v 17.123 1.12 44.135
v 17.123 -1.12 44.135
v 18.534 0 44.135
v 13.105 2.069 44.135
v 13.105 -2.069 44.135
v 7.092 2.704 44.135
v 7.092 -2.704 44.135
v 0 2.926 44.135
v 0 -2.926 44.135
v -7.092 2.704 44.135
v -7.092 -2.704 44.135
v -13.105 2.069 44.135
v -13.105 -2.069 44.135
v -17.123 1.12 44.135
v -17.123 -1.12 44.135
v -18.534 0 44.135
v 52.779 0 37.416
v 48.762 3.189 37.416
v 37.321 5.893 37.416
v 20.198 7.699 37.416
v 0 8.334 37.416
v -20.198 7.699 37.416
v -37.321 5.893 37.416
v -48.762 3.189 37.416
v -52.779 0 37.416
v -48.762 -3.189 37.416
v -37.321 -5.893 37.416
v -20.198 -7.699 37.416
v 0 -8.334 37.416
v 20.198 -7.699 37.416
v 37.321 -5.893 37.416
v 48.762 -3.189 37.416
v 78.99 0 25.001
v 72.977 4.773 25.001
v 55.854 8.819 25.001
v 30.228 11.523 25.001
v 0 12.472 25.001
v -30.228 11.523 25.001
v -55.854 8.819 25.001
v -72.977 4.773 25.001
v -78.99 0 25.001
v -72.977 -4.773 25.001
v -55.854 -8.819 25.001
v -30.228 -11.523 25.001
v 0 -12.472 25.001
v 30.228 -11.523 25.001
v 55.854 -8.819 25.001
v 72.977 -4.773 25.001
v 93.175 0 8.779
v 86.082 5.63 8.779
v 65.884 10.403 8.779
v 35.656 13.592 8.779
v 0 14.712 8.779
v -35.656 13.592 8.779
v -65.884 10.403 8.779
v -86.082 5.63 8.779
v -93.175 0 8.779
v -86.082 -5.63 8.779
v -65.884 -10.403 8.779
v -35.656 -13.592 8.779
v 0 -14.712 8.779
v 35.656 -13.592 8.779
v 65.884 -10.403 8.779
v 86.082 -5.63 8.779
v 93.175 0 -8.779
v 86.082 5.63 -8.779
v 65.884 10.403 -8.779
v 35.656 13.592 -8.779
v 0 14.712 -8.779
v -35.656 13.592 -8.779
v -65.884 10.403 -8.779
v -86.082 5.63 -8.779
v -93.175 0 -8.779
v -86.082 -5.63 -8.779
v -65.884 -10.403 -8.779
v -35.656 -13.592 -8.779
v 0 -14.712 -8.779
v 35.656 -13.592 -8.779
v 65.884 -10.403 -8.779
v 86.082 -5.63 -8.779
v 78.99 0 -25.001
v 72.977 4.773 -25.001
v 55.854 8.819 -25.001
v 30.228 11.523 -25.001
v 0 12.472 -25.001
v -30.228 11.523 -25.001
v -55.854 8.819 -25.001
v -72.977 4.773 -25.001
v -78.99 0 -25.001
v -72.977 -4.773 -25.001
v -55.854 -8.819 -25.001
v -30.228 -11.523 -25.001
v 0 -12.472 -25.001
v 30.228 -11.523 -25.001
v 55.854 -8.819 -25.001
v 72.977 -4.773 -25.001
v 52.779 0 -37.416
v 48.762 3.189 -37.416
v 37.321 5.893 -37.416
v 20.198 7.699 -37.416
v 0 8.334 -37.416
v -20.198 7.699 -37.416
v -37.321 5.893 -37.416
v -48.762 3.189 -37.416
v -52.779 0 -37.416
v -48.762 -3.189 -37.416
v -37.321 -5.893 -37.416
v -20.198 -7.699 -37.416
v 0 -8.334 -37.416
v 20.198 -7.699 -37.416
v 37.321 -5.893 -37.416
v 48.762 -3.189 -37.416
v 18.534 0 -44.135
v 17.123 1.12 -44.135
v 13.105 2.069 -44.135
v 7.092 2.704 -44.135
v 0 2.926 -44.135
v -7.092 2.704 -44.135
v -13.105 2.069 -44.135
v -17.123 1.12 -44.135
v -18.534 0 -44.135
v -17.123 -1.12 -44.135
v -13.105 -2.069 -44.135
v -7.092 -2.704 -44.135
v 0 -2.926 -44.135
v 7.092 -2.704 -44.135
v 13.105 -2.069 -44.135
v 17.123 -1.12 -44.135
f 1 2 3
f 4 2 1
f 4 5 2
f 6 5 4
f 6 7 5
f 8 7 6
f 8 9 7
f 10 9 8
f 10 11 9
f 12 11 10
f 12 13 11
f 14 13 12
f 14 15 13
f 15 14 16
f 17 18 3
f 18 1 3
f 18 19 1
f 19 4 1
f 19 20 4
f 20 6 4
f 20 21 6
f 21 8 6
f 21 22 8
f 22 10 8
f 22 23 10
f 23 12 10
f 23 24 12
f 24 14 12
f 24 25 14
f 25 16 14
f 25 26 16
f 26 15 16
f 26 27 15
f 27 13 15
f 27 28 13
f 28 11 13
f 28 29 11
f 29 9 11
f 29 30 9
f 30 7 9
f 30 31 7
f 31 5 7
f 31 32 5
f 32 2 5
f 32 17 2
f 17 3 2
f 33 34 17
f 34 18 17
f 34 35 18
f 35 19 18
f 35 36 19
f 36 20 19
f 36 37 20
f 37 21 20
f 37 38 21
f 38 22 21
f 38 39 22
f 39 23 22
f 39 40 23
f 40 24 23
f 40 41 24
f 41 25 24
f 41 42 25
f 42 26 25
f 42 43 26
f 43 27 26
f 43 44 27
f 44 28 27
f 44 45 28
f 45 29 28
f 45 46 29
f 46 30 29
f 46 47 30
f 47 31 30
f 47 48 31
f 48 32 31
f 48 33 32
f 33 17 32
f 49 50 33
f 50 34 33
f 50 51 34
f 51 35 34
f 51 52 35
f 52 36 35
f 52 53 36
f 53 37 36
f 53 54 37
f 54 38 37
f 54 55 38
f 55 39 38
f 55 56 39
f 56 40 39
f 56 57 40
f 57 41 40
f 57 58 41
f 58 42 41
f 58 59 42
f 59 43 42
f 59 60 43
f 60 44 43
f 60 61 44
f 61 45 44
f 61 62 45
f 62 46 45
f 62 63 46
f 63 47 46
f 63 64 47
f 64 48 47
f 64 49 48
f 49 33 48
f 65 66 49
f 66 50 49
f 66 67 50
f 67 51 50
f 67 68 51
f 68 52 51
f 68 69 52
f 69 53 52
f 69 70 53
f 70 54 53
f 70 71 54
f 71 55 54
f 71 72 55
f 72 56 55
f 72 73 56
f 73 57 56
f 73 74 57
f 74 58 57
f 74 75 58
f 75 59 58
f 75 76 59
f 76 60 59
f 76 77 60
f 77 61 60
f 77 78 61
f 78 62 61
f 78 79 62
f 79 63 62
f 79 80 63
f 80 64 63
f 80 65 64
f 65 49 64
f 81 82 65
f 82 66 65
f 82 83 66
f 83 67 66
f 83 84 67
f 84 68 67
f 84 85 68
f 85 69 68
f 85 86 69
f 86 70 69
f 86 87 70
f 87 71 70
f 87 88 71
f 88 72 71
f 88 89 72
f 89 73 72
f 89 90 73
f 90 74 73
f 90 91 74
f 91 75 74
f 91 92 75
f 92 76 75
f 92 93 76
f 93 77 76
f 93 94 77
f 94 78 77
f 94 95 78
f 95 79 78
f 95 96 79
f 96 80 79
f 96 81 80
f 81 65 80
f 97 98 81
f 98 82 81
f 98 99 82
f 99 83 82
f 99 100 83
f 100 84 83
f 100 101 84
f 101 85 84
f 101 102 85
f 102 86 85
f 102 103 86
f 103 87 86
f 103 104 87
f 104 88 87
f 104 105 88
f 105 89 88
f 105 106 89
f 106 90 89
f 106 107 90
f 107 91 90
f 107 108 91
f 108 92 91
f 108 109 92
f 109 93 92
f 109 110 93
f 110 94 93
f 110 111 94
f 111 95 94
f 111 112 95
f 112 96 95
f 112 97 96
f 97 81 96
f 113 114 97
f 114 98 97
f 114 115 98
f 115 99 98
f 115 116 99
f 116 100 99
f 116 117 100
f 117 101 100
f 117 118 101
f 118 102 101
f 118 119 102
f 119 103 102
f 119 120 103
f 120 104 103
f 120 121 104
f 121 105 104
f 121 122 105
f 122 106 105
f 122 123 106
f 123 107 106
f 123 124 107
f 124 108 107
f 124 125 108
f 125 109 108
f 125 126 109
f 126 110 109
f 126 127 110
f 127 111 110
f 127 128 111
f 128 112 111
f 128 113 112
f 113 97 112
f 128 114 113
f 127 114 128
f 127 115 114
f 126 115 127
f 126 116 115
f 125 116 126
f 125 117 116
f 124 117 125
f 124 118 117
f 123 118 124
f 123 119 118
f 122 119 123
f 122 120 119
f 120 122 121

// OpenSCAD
// Generated by SolidPython 1.0.1 on 2020-07-29 00:46:53


scale(v = [19, 3, 9]) {
	sphere(r = 5);
}
/***********************************************
*********      SolidPython code:      **********
************************************************
 
# import packages: SolidPython
from solid import *
from solid.utils import *
from itertools import chain, combinations, permutations


class Resize:

    def __init__(self, scad_file):
        self.scad_file = scad_file
        #self.scad_file = import_scad(scad_file)
        # cone/cylinder param:
        self.r1 = 0
        self.r2 = 0
        self.h = 0
        # rectangular prism param:
        self.w = 0
        self.l = 0
        # ellipse param:
        self.r = 0

    # import OpenScad code (file name corresponds to shape)


    # classify shape + parameters
    def assign(self, param1, param2, param3):
        if self.scad_file == 'cone.scad':
            self.r1 = param1
            self.r2 = param2
            self.h = param3
        elif self.scad_file == 'cylinder.scad':
            self.r1 = param1
            self.r2 = param2
            self.h = param3
        elif self.scad_file == 'rectangularPrism.scad':
            self.h = param1
            self.l = param2
            self.w = param3
        else:
            self.r = param1
            self.h = param2

    # resize parameters
    def iterate(self):
        x = range(3, 20, 2)
        i = 1
        if self.scad_file == 'cone.scad':
            tempList = list(permutations(x, 2))
            for temp in tempList:
                param1 = temp[0]
                param2 = temp[1]
                filepath = 'produced_scad_files/' + 'cone' + str(param1) + '_' + str(param2) + '_' + '.scad'
                scad_render_to_file(cylinder(h=param1, r1=param2, r2=0), filepath)

        elif self.scad_file == 'cylinder.scad':
            tempList = list(permutations(x, 3))
            for temp in tempList:
                param1 = temp[0]
                param2 = temp[1]
                filepath = 'produced_scad_files/' + 'cylinder' + str(param1) + '_' + str(param2) + '_' + '.scad'
                scad_render_to_file(cylinder(h=param1, r1=param2, r2=param2), filepath)

        elif self.scad_file == 'rectangularPrism.scad':
            tempList = list(permutations(x, 3))
            for temp in tempList:
                param1 = temp[0]
                param2 = temp[1]
                param3 = temp[2]
                filepath = 'produced_scad_files/' + 'rectangularPrism' + str(param1) + '_' + str(param2) + '_' + str(
                    param3) + '.scad'
                scad_render_to_file(cube(size=(param1, param2, param3)), filepath)

        elif self.scad_file == 'ellipse.scad':
            tempList = list(permutations(x, 4))
            for temp in tempList:
                param1 = temp[0]
                param2 = temp[1]
                param3 = temp[2]
                param4 = temp[3]
                filepath = 'produced_scad_files/' + 'ellipse' + str(param1) + '_' + str(param2) + '_' + str(param3) + '_' + str(param4) + '.scad'
                scad_render_to_file(scale([param1, param2, param3])(sphere(r=param4)), filepath)

    def render_to_scadfile(self):
        scad_render_to_file(scad, 'example.scad') 
 
************************************************/
